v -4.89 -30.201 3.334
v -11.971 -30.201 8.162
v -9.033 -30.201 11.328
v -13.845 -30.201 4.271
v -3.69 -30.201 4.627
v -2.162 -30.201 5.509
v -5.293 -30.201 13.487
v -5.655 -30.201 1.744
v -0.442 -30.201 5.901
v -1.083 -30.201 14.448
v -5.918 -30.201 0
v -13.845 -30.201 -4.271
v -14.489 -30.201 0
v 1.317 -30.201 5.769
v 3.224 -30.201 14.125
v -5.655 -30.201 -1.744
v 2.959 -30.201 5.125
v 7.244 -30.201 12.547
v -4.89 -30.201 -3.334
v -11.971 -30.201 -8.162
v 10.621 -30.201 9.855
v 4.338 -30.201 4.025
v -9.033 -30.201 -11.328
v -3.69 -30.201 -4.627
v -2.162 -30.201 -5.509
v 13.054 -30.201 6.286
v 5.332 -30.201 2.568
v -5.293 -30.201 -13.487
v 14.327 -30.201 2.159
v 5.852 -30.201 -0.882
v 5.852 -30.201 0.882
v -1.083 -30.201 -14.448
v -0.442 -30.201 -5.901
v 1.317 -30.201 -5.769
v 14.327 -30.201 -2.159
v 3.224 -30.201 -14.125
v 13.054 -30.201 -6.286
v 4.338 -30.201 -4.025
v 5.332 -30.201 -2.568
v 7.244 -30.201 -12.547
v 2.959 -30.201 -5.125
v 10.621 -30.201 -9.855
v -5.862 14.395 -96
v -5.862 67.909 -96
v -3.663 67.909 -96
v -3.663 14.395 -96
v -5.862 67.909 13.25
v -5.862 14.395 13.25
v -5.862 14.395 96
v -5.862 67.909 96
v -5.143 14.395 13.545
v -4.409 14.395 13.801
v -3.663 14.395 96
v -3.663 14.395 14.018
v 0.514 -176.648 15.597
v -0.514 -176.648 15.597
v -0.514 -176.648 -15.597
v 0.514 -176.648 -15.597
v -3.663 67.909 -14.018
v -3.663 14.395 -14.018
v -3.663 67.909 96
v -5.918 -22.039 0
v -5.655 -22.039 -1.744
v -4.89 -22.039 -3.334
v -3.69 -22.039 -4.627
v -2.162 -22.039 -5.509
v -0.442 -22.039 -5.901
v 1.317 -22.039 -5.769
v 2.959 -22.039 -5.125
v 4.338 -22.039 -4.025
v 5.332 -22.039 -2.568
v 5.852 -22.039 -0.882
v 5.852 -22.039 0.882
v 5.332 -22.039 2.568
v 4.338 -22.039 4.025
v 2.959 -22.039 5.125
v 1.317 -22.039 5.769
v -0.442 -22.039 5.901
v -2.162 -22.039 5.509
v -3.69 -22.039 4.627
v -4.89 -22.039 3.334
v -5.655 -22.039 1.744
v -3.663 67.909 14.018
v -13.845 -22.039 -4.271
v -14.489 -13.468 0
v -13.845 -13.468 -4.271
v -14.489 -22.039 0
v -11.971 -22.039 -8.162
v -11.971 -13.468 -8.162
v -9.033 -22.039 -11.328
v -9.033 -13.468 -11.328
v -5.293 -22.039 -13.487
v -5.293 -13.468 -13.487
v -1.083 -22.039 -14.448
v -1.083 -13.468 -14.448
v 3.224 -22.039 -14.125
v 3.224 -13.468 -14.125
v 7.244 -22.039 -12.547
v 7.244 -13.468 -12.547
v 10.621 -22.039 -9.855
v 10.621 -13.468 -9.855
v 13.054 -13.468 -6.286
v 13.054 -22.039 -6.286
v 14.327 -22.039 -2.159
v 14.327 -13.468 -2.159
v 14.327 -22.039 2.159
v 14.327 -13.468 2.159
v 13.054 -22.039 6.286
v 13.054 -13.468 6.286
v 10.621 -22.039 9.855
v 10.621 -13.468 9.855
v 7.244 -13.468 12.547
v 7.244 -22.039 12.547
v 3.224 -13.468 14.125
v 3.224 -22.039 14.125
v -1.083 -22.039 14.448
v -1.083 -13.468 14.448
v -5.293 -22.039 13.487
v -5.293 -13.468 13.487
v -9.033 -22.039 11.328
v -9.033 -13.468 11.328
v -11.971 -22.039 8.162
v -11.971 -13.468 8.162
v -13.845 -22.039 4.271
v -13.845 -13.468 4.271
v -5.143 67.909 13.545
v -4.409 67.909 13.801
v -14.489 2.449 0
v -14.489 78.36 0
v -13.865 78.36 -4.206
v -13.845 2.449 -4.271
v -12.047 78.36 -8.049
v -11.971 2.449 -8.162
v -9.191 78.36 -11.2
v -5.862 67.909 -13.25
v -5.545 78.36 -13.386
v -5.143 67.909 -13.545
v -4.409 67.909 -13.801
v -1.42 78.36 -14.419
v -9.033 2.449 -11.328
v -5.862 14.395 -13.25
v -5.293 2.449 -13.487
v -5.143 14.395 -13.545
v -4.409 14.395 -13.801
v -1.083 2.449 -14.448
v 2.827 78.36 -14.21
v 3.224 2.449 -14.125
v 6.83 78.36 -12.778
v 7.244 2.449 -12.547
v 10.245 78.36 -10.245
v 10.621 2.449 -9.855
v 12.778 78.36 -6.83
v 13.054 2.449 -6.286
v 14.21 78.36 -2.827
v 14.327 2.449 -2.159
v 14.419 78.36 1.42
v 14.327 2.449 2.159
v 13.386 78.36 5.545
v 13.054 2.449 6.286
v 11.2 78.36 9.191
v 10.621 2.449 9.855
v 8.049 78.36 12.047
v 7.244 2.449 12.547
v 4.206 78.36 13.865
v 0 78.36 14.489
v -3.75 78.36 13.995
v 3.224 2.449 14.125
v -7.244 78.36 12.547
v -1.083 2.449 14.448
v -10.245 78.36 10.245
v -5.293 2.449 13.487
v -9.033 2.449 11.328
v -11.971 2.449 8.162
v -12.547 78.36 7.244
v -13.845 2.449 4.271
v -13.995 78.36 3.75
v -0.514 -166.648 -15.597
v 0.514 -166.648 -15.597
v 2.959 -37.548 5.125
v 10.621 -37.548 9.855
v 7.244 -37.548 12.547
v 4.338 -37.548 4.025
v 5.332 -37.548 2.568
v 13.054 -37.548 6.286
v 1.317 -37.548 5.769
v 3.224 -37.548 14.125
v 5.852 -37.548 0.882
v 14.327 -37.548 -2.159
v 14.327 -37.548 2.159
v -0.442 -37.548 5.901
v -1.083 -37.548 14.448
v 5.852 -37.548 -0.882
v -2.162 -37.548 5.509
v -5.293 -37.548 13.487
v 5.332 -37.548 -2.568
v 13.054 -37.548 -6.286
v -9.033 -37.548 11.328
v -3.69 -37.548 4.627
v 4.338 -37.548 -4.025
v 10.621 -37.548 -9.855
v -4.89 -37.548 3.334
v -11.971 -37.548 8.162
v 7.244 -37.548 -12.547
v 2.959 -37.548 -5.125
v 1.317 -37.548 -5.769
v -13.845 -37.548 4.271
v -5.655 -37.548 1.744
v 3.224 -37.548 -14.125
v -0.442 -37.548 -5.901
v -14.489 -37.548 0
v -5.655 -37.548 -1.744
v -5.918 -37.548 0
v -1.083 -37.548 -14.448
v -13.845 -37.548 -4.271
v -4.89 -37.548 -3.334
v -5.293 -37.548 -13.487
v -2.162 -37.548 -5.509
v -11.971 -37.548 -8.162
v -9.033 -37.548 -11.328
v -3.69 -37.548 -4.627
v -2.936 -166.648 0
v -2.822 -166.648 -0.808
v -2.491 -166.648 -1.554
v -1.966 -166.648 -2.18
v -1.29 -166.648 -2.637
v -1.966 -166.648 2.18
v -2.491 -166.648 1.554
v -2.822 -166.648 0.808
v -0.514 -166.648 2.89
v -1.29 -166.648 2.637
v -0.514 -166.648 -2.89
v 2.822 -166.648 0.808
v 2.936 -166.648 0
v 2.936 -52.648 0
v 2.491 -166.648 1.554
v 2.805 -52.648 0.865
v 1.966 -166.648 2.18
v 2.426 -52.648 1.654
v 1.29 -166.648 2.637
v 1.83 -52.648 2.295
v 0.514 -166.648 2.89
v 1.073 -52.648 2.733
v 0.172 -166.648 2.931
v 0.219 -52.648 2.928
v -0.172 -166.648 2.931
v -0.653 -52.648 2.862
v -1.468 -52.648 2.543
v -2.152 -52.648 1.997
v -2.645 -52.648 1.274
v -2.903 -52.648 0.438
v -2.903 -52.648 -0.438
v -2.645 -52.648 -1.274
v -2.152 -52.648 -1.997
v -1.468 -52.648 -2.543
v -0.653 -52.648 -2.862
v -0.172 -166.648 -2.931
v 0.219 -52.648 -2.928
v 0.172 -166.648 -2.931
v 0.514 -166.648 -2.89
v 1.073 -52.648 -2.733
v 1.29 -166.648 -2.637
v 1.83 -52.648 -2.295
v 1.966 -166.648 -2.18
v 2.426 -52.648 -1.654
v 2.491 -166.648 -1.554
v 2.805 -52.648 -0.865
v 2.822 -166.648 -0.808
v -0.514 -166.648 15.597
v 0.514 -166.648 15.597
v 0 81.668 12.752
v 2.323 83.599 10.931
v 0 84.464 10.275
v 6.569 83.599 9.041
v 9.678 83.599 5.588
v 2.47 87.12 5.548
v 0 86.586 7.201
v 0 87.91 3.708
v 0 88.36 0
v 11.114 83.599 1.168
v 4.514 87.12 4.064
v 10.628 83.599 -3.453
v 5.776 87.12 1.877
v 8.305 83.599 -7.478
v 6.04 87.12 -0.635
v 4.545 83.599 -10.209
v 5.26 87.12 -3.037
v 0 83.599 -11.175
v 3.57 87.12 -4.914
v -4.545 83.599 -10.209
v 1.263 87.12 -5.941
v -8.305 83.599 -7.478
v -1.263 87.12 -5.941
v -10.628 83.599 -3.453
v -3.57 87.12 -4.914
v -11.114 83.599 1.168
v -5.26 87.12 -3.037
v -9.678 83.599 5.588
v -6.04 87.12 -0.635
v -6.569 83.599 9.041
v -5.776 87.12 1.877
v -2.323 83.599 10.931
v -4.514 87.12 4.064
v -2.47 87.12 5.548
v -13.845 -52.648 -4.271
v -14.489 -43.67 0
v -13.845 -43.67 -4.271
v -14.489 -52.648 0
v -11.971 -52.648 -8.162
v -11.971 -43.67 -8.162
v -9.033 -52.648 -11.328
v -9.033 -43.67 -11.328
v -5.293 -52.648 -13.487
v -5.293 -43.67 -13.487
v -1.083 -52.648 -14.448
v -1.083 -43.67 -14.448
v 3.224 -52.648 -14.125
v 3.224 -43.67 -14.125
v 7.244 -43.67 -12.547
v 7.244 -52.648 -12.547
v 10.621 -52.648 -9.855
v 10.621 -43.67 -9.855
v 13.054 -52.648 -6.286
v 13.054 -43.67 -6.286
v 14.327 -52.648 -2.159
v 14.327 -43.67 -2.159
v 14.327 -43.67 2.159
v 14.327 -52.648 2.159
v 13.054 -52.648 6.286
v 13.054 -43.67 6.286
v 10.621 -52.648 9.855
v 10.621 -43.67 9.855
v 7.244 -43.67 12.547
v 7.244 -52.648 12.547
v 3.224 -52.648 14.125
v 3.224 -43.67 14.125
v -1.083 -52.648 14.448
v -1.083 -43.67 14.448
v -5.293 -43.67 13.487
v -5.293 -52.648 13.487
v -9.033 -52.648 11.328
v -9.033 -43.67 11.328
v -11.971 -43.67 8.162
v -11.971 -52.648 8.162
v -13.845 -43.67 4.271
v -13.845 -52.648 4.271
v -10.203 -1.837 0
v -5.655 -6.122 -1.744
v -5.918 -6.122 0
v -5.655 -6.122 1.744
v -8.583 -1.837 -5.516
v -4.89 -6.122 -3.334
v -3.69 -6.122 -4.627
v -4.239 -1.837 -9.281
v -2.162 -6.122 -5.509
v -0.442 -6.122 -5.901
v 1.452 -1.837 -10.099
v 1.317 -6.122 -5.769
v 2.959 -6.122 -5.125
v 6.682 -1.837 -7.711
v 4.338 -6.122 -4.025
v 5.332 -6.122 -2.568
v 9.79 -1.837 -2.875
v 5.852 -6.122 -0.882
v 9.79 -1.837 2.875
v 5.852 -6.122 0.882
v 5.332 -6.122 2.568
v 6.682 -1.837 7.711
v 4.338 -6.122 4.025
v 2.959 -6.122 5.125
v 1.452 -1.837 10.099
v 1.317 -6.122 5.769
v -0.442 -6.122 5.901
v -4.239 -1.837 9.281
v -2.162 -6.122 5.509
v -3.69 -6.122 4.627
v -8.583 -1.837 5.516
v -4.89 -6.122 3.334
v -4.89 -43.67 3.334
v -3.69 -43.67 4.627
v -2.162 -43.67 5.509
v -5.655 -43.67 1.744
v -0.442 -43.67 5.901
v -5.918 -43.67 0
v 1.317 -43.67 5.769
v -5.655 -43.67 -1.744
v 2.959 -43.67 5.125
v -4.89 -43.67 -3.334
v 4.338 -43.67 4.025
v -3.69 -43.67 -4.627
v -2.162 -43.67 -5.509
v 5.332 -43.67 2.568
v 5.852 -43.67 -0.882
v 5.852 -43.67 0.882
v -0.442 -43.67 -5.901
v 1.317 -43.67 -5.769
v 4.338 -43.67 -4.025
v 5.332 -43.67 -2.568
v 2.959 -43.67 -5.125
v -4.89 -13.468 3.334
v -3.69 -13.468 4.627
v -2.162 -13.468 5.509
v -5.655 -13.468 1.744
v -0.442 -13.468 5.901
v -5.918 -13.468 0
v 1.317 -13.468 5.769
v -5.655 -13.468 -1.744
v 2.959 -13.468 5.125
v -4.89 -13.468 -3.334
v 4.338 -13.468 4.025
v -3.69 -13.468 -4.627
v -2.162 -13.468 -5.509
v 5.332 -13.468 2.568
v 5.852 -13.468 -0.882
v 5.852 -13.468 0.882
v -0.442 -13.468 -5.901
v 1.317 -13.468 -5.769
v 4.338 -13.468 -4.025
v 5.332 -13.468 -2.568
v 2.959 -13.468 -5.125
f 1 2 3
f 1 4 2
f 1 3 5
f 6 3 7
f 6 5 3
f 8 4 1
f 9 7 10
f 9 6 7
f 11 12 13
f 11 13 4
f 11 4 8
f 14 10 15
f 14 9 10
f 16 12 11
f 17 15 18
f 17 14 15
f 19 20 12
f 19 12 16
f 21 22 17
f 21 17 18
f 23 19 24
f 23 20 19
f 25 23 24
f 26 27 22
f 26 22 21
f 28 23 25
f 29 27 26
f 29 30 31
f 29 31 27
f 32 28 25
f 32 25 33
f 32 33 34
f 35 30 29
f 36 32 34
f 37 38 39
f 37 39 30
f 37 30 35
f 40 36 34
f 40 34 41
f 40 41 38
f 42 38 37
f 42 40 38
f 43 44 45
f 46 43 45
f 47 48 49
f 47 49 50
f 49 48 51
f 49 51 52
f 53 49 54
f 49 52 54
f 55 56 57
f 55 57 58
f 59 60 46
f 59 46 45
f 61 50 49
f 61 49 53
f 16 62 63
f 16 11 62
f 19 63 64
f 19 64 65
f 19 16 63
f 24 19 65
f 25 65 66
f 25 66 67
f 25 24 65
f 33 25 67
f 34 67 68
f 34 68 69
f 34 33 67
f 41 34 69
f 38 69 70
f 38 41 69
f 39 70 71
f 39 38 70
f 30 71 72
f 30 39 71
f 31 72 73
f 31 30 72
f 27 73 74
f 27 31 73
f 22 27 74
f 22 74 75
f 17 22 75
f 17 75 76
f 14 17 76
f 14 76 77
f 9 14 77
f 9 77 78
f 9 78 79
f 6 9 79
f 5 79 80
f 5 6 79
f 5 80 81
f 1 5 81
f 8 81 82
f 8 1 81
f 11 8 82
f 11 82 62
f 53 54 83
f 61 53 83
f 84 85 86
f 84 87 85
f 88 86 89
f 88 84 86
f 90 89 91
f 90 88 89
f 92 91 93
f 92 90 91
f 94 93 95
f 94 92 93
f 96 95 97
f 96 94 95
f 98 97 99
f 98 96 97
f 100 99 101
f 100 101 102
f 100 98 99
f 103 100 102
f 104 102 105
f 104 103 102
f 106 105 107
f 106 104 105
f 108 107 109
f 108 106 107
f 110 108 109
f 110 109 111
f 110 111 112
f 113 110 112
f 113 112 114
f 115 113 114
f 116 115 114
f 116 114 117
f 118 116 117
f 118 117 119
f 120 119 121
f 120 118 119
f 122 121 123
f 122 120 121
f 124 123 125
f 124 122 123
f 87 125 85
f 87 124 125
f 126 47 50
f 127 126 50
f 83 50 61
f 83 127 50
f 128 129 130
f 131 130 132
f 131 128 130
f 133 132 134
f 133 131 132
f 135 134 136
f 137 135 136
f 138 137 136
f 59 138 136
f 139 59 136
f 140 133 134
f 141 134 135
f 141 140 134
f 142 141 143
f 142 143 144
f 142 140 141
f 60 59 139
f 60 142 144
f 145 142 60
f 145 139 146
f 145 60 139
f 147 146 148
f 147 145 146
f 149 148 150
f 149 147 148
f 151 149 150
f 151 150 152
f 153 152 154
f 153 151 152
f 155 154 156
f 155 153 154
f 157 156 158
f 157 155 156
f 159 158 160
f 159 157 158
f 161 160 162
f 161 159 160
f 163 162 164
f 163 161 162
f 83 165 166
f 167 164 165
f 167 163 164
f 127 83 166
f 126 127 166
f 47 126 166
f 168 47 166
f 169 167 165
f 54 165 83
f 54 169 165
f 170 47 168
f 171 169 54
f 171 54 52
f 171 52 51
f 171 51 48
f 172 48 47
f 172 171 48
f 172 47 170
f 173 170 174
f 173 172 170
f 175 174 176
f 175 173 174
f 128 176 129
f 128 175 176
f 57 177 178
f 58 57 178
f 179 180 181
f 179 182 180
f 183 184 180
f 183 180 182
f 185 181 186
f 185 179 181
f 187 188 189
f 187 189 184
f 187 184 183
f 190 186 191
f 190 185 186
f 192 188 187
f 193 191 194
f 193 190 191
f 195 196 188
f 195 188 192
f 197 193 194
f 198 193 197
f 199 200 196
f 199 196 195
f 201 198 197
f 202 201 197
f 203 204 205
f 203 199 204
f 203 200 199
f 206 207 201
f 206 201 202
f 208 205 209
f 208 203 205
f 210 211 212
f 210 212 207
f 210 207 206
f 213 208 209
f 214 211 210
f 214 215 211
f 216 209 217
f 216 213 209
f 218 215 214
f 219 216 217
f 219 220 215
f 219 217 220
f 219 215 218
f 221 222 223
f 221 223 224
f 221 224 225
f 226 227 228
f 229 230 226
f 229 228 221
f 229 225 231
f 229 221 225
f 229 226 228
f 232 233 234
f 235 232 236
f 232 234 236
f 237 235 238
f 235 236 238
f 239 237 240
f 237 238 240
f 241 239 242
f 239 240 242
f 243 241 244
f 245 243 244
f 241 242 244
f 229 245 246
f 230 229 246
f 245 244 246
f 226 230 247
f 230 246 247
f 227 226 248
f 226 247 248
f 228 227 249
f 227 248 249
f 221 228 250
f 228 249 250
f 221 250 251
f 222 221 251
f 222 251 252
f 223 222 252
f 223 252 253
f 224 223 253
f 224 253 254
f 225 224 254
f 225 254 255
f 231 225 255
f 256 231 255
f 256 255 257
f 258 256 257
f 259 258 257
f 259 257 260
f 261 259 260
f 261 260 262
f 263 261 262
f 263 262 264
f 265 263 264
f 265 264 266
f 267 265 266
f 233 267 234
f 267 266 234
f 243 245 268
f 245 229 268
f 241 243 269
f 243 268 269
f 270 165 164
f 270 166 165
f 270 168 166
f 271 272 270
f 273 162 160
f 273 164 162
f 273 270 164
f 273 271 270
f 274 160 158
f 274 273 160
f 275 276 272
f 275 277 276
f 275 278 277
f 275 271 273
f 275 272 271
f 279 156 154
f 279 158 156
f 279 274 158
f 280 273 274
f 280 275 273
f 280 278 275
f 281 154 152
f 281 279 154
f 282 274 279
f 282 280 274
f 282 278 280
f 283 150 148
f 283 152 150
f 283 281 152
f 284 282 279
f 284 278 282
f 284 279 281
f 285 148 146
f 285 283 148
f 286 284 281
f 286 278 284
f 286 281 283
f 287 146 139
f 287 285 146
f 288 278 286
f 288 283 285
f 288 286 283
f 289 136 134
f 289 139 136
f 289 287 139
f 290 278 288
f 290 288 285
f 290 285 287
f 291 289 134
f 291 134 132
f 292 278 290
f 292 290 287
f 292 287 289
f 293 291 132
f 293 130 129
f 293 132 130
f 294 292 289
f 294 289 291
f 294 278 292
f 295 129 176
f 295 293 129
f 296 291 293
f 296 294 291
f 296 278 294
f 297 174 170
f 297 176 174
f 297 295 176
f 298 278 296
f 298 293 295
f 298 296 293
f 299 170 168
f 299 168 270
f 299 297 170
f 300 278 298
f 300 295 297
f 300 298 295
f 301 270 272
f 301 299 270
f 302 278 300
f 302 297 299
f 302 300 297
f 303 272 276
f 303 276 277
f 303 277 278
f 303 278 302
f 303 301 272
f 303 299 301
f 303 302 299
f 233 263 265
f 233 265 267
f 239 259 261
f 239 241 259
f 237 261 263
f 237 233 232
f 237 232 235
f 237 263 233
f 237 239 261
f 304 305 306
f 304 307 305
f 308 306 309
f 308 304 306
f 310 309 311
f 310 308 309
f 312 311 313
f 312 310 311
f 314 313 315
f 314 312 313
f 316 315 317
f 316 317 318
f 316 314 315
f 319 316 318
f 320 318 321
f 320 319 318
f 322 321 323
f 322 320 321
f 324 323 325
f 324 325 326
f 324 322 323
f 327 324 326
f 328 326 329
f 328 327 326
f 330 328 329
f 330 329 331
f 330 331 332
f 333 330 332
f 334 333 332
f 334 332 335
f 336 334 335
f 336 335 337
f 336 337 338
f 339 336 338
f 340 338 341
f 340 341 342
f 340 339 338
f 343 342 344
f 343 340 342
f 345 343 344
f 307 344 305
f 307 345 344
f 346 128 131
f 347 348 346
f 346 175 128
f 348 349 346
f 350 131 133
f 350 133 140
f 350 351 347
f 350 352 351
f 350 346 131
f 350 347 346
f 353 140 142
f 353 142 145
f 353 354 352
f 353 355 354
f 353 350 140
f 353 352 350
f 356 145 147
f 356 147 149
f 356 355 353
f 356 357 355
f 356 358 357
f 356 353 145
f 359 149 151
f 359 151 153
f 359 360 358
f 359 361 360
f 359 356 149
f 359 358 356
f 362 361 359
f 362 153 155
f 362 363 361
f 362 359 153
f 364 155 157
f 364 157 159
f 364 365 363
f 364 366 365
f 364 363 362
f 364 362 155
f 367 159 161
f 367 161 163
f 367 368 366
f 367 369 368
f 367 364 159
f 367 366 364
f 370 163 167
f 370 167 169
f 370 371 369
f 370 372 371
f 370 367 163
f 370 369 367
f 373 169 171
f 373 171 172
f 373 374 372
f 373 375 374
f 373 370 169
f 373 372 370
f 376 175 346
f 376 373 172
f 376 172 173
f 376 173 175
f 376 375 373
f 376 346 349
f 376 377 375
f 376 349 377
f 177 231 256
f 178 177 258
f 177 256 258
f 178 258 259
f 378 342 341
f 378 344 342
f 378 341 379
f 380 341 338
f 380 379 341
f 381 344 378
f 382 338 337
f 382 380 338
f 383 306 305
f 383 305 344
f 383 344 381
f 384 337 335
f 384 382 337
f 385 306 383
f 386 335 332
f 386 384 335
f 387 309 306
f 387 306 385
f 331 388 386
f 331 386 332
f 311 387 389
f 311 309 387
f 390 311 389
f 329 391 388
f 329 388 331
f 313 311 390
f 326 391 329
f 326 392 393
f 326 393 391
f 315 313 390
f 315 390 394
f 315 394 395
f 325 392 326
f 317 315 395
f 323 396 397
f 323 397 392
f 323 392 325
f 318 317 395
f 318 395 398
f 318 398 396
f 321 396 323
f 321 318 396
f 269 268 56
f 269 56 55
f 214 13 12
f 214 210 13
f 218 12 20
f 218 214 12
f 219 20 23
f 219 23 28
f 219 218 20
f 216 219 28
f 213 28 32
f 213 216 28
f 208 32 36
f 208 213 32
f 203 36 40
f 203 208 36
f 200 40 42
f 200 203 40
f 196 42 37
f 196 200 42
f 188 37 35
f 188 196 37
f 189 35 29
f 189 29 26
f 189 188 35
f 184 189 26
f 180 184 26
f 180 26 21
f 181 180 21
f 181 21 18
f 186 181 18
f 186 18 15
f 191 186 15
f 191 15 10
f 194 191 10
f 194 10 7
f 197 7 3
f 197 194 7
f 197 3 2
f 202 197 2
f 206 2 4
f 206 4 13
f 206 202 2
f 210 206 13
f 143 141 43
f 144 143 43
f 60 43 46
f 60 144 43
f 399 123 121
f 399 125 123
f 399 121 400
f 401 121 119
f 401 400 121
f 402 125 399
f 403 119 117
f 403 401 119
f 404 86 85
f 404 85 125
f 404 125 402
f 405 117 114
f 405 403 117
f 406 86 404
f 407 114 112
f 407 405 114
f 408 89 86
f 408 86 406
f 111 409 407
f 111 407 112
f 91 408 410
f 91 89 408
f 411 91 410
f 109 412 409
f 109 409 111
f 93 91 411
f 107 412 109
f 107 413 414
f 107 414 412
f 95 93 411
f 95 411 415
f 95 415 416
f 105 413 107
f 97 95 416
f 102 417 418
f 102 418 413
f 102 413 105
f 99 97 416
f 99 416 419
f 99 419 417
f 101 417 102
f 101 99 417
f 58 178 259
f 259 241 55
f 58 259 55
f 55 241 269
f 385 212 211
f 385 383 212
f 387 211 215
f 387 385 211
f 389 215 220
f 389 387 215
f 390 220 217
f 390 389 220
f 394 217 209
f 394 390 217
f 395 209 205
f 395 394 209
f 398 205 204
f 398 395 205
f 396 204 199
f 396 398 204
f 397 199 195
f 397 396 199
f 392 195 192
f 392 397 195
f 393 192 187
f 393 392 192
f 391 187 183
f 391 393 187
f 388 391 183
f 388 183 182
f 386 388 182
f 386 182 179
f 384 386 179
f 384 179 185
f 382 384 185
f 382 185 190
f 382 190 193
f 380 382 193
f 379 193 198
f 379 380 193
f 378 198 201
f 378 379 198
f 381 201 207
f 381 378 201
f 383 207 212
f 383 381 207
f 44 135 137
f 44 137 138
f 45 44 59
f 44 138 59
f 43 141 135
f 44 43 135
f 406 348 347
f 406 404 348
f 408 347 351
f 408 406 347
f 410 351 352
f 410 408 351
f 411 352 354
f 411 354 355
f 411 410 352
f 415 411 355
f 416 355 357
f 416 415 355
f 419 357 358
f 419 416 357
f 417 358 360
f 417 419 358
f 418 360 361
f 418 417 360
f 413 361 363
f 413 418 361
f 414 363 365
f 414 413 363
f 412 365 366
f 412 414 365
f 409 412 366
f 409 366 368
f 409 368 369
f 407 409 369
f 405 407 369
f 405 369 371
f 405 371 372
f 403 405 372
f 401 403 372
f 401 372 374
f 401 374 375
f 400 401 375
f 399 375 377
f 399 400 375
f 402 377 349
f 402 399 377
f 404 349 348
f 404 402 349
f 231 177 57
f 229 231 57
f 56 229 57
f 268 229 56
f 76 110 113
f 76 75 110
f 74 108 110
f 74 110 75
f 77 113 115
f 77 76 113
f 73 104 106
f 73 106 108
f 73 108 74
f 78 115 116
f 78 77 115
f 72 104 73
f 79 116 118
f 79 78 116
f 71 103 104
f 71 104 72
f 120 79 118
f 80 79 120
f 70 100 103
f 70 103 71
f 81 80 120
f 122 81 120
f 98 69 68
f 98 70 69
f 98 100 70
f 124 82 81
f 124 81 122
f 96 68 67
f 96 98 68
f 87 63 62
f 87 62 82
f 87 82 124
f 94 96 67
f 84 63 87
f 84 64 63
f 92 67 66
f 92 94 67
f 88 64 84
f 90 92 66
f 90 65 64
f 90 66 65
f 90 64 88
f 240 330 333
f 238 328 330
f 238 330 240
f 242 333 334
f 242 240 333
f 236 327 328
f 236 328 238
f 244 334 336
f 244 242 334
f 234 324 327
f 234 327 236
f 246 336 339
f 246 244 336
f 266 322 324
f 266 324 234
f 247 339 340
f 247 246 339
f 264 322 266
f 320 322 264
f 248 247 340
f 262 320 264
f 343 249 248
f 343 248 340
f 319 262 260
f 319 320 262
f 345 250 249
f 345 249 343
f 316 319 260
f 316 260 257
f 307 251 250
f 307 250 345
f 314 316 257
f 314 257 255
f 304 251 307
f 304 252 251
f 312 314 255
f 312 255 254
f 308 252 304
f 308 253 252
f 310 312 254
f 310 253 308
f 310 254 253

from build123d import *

# Parameters (mm, degrees)
DOME1_FACE_RADIUS   = 14.488501688
DOME1_HEIGHT        = 10
SKETCH4_W           = 2.198846944
SKETCH4_H           = 53.513980491
BOSS_EXTRUDE1_DEPTH = 96
SKETCH5_R           = 2.935842155
BOSS_EXTRUDE2_DEPTH = 114
SKETCH7_W           = 1.028080296
SKETCH7_H           = 31.194109998
BOSS_EXTRUDE3_DEPTH = 10


with BuildPart() as part:
    # Sketch1 → Revolve1 (revolve)
    with BuildSketch(Plane.XY):
        Polygon((0, 78.360347155), (-14.488501688, 78.360347155), (-14.488501688, 2.448760849), (-5.917838717, -6.121902122), (-5.917838717, -13.468184667), (-14.488501688, -13.468184667), (-14.488501688, -22.038847637), (-5.917838717, -22.038847637), (-5.917838717, -30.201383799), (-14.488501688, -30.201383799), (-14.488501688, -37.547666345), (-5.917838717, -37.547666345), (-5.917838717, -43.669568467), (-14.488501688, -43.669568467), (-14.488501688, -52.648358245), (-5.917838717, -52.648358245), (0, -52.648358245), align=None)
    revolve(axis=Axis((0, 93.052912247, 0), (0, -1, 0)))

    # Dome1: a dome of height H over a round flat face of radius A is a cap of a sphere of radius (A * A + H * H) / (2 * H)
    dome1_r = (DOME1_FACE_RADIUS * DOME1_FACE_RADIUS + DOME1_HEIGHT * DOME1_HEIGHT) / (2 * DOME1_HEIGHT)
    dome1_base = Plane((0, 78.360347155, 0), z_dir=(0, 1, 0))
    with Locations(dome1_base.offset(DOME1_HEIGHT - dome1_r)):
        dome1_ball = Sphere(dome1_r, mode=Mode.PRIVATE)
    add(split(dome1_ball, bisect_by=dome1_base, keep=Keep.TOP, mode=Mode.PRIVATE))

    # Sketch4 → Boss-Extrude1 (add)
    with BuildSketch(Plane.XY):
        with Locations((-4.762390363, 41.15200271)):
            Rectangle(SKETCH4_W, SKETCH4_H)
    boss_extrude1 = extrude(amount=BOSS_EXTRUDE1_DEPTH)

    # Mirror1: Boss-Extrude1 across plane
    add(boss_extrude1.mirror(Plane.XY))

    # Sketch5 → Boss-Extrude2 (add)
    with BuildSketch(Plane.XZ.offset(52.648358245)):
        Circle(SKETCH5_R)
    extrude(amount=BOSS_EXTRUDE2_DEPTH)

    # Sketch7 → Boss-Extrude3 (add)
    with BuildSketch(Plane.XZ.offset(166.648358245)):
        Rectangle(SKETCH7_W, SKETCH7_H)
    extrude(amount=BOSS_EXTRUDE3_DEPTH)


solid = part.part
